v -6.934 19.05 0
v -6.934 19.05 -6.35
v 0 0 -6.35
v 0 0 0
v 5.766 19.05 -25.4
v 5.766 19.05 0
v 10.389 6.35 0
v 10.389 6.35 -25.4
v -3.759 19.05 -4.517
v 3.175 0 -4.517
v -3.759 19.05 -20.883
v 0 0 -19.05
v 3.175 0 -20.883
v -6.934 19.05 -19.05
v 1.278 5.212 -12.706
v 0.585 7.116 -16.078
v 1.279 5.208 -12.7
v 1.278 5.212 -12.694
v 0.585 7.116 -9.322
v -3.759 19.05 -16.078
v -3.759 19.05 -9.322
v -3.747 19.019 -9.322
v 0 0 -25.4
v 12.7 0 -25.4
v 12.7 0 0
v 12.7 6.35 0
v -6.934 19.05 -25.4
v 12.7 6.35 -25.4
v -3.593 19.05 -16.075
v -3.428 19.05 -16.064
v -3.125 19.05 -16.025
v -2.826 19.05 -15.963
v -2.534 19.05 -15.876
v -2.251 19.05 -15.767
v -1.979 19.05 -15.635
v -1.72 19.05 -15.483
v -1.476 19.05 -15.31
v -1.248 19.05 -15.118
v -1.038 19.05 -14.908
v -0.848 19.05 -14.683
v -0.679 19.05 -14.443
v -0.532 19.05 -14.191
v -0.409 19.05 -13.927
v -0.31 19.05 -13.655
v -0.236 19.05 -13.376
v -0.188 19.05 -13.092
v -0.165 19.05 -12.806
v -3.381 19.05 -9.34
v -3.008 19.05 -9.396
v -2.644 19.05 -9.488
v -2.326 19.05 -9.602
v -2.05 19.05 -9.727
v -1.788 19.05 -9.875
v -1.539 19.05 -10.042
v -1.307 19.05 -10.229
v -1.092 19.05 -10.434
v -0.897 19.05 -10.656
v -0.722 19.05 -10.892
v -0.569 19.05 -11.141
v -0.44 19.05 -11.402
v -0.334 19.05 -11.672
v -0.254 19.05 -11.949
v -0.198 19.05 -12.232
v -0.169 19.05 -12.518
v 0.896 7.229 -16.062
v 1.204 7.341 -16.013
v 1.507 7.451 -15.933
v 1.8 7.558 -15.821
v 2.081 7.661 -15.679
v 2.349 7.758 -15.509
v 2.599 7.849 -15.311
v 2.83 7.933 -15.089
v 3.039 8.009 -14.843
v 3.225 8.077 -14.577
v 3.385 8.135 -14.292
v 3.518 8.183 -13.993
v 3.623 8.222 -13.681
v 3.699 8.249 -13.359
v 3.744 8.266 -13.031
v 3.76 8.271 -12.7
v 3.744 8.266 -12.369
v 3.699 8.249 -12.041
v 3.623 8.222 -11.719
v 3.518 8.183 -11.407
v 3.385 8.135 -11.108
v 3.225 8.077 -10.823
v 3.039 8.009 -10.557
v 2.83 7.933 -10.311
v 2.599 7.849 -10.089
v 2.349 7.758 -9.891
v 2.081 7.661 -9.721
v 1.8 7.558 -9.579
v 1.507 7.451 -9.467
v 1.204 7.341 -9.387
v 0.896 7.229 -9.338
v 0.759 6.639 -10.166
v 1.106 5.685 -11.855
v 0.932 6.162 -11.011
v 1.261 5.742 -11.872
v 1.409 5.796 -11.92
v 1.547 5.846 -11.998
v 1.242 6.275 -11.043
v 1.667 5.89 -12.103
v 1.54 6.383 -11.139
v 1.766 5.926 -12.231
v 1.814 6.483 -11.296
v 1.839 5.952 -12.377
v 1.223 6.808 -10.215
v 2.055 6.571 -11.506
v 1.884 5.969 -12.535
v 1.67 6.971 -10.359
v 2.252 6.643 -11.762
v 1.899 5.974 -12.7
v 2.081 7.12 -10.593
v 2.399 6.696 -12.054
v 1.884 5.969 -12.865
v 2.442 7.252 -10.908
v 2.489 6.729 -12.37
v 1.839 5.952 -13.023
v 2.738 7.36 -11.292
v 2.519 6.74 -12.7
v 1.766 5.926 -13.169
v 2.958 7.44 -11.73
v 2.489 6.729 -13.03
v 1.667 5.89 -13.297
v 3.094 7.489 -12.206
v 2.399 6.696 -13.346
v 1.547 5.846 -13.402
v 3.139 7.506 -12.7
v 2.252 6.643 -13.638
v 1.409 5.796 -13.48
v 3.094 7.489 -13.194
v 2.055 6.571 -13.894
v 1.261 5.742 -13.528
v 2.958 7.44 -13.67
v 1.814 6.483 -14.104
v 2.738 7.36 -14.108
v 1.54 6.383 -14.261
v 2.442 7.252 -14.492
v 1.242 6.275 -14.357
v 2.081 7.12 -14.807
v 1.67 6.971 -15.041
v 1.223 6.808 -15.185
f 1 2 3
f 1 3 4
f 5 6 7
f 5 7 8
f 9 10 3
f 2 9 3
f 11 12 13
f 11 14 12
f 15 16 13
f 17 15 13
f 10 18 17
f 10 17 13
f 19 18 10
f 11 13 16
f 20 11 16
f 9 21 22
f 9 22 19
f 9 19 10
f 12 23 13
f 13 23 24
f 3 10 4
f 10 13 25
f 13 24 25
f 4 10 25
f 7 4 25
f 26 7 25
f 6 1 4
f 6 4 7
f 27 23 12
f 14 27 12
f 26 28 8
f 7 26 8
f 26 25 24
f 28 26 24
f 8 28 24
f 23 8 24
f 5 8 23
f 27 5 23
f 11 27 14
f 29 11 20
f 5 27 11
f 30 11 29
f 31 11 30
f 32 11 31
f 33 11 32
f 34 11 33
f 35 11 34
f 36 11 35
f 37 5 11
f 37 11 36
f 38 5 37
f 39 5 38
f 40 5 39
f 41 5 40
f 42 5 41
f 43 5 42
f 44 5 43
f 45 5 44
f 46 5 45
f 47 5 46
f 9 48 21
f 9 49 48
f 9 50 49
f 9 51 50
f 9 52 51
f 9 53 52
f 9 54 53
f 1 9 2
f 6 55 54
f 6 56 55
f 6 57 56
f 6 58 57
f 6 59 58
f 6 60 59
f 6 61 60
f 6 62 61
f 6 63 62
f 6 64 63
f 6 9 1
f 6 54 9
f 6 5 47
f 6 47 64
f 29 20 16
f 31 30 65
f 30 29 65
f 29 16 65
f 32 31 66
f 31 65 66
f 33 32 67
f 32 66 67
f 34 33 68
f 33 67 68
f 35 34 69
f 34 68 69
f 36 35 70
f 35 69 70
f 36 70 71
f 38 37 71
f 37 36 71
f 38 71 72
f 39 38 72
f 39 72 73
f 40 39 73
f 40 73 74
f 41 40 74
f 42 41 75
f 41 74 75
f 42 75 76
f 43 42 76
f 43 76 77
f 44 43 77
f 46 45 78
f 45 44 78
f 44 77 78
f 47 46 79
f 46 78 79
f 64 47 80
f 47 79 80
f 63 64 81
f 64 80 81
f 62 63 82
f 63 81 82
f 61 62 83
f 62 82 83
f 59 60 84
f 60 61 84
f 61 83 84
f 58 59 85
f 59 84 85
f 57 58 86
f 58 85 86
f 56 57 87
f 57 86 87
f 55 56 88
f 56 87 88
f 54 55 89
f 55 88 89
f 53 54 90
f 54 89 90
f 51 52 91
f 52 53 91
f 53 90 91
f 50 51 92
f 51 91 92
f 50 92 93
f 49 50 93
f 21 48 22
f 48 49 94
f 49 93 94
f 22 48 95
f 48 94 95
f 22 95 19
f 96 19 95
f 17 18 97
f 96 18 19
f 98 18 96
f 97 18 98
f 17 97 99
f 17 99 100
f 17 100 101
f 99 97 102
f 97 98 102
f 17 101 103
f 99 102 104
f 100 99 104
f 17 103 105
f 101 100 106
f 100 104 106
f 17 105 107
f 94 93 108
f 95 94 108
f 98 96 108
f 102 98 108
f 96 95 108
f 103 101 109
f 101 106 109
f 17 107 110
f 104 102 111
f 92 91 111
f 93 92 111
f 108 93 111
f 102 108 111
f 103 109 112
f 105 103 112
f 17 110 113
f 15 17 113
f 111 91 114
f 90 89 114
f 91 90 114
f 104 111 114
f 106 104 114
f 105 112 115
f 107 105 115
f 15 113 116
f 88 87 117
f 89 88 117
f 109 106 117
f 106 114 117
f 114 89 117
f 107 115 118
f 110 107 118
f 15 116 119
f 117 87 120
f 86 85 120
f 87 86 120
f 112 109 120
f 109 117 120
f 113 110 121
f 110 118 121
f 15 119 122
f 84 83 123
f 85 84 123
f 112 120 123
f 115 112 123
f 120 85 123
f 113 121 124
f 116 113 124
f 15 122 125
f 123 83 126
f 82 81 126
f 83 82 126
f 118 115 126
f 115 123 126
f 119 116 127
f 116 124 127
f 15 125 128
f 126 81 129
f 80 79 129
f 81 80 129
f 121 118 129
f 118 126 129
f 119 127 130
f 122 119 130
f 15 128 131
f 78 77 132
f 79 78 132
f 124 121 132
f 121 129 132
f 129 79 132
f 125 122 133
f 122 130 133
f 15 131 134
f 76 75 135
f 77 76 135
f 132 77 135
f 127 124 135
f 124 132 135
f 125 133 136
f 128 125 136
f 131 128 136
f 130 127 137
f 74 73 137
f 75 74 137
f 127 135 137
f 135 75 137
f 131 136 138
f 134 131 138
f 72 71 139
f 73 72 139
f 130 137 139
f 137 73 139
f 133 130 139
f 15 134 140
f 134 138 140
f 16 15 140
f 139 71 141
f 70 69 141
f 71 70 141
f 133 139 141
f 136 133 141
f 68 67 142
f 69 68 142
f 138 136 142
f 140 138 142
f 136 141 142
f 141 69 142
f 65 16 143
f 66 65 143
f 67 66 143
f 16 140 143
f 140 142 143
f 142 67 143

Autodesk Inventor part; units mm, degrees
ref_plane "YZ Plane" through (0, 0, 0) normal (1, 0, 0) x (0, 1, 0)
ref_plane "XZ Plane" through (0, 0, 0) normal (0, 1, 0) x (-1, 0, 0)
sketch "Sketch1" plane through (0, 0, 0) normal (0, 1, 0) x (-1, 0, 0)
  line L0 (0, 0) -> (-12.7, 0)
  line L1 (-12.7, 0) -> (-12.7, -25.4)
  line L2 (-12.7, -25.4) -> (0, -25.4)
  line L3 (0, -25.4) -> (0, 0)
  line L4 (0, -12.7) -> (-12.7, -12.7) construction
  line L5 (-3.175, -25.4) -> (-3.175, 0)
  line L6 (-3.175, -20.8831) -> (0, -19.05)
  line L7 (-3.175, -4.5169) -> (0, -6.35)
  line L8 (-9.525, -25.4) -> (-9.525, 0)
  point P0 (-3.175, -12.7)
  point P1 (0, -6.35)
  dimension "d0" = 12.7
  dimension "d7" = 25.4
  dimension "d34" = 3.175
  dimension "d35" = 60
  dimension "d36" = 12.7
  dimension "d57" = 3.175
sketch "Sketch8" plane through (0, 0, 0) normal (0, 0, 1) x (1, 0, 0)
  line L0 (0, 0) -> (-6.9336, 19.05)
  line L1 (0, 0) -> (20.2726, 0) construction
  dimension "d53" = 110
  dimension "d54" = 19.05
sweep "Sweep3" add profiles "Sketch1" path "Sketch8" contours L3 L7 L5 L0 | L5 L2 L8 L0 | L8 L2 L1 L0 | L3 L2 L5 L6
extrude "Extrusion3" add sketch "Sketch1" along normal blind 6.35 contours L8 L2 L1 L0
ref_plane "Work Plane6" through (-3.7586, 19.05, -25.4) normal (-0.342, 0.9397, 0) x (0, 0, 1)
sketch "Sketch9" plane through (-3.7586, 19.05, -25.4) normal (-0.342, 0.9397, 0) x (0, 0, 1)
  line L0 (4.5169, 0) -> (20.8831, 0) construction
  point P0 (12.7, 0)
hole "Hole4" at (-3.7586, 19.05, -12.7) direction (0.342, -0.9397, 0) diameter 6.7564 depth 12.7 tip angle 118
equation "\"slopeAngle\" = 70deg"
properties material "Steel, Alloy"
